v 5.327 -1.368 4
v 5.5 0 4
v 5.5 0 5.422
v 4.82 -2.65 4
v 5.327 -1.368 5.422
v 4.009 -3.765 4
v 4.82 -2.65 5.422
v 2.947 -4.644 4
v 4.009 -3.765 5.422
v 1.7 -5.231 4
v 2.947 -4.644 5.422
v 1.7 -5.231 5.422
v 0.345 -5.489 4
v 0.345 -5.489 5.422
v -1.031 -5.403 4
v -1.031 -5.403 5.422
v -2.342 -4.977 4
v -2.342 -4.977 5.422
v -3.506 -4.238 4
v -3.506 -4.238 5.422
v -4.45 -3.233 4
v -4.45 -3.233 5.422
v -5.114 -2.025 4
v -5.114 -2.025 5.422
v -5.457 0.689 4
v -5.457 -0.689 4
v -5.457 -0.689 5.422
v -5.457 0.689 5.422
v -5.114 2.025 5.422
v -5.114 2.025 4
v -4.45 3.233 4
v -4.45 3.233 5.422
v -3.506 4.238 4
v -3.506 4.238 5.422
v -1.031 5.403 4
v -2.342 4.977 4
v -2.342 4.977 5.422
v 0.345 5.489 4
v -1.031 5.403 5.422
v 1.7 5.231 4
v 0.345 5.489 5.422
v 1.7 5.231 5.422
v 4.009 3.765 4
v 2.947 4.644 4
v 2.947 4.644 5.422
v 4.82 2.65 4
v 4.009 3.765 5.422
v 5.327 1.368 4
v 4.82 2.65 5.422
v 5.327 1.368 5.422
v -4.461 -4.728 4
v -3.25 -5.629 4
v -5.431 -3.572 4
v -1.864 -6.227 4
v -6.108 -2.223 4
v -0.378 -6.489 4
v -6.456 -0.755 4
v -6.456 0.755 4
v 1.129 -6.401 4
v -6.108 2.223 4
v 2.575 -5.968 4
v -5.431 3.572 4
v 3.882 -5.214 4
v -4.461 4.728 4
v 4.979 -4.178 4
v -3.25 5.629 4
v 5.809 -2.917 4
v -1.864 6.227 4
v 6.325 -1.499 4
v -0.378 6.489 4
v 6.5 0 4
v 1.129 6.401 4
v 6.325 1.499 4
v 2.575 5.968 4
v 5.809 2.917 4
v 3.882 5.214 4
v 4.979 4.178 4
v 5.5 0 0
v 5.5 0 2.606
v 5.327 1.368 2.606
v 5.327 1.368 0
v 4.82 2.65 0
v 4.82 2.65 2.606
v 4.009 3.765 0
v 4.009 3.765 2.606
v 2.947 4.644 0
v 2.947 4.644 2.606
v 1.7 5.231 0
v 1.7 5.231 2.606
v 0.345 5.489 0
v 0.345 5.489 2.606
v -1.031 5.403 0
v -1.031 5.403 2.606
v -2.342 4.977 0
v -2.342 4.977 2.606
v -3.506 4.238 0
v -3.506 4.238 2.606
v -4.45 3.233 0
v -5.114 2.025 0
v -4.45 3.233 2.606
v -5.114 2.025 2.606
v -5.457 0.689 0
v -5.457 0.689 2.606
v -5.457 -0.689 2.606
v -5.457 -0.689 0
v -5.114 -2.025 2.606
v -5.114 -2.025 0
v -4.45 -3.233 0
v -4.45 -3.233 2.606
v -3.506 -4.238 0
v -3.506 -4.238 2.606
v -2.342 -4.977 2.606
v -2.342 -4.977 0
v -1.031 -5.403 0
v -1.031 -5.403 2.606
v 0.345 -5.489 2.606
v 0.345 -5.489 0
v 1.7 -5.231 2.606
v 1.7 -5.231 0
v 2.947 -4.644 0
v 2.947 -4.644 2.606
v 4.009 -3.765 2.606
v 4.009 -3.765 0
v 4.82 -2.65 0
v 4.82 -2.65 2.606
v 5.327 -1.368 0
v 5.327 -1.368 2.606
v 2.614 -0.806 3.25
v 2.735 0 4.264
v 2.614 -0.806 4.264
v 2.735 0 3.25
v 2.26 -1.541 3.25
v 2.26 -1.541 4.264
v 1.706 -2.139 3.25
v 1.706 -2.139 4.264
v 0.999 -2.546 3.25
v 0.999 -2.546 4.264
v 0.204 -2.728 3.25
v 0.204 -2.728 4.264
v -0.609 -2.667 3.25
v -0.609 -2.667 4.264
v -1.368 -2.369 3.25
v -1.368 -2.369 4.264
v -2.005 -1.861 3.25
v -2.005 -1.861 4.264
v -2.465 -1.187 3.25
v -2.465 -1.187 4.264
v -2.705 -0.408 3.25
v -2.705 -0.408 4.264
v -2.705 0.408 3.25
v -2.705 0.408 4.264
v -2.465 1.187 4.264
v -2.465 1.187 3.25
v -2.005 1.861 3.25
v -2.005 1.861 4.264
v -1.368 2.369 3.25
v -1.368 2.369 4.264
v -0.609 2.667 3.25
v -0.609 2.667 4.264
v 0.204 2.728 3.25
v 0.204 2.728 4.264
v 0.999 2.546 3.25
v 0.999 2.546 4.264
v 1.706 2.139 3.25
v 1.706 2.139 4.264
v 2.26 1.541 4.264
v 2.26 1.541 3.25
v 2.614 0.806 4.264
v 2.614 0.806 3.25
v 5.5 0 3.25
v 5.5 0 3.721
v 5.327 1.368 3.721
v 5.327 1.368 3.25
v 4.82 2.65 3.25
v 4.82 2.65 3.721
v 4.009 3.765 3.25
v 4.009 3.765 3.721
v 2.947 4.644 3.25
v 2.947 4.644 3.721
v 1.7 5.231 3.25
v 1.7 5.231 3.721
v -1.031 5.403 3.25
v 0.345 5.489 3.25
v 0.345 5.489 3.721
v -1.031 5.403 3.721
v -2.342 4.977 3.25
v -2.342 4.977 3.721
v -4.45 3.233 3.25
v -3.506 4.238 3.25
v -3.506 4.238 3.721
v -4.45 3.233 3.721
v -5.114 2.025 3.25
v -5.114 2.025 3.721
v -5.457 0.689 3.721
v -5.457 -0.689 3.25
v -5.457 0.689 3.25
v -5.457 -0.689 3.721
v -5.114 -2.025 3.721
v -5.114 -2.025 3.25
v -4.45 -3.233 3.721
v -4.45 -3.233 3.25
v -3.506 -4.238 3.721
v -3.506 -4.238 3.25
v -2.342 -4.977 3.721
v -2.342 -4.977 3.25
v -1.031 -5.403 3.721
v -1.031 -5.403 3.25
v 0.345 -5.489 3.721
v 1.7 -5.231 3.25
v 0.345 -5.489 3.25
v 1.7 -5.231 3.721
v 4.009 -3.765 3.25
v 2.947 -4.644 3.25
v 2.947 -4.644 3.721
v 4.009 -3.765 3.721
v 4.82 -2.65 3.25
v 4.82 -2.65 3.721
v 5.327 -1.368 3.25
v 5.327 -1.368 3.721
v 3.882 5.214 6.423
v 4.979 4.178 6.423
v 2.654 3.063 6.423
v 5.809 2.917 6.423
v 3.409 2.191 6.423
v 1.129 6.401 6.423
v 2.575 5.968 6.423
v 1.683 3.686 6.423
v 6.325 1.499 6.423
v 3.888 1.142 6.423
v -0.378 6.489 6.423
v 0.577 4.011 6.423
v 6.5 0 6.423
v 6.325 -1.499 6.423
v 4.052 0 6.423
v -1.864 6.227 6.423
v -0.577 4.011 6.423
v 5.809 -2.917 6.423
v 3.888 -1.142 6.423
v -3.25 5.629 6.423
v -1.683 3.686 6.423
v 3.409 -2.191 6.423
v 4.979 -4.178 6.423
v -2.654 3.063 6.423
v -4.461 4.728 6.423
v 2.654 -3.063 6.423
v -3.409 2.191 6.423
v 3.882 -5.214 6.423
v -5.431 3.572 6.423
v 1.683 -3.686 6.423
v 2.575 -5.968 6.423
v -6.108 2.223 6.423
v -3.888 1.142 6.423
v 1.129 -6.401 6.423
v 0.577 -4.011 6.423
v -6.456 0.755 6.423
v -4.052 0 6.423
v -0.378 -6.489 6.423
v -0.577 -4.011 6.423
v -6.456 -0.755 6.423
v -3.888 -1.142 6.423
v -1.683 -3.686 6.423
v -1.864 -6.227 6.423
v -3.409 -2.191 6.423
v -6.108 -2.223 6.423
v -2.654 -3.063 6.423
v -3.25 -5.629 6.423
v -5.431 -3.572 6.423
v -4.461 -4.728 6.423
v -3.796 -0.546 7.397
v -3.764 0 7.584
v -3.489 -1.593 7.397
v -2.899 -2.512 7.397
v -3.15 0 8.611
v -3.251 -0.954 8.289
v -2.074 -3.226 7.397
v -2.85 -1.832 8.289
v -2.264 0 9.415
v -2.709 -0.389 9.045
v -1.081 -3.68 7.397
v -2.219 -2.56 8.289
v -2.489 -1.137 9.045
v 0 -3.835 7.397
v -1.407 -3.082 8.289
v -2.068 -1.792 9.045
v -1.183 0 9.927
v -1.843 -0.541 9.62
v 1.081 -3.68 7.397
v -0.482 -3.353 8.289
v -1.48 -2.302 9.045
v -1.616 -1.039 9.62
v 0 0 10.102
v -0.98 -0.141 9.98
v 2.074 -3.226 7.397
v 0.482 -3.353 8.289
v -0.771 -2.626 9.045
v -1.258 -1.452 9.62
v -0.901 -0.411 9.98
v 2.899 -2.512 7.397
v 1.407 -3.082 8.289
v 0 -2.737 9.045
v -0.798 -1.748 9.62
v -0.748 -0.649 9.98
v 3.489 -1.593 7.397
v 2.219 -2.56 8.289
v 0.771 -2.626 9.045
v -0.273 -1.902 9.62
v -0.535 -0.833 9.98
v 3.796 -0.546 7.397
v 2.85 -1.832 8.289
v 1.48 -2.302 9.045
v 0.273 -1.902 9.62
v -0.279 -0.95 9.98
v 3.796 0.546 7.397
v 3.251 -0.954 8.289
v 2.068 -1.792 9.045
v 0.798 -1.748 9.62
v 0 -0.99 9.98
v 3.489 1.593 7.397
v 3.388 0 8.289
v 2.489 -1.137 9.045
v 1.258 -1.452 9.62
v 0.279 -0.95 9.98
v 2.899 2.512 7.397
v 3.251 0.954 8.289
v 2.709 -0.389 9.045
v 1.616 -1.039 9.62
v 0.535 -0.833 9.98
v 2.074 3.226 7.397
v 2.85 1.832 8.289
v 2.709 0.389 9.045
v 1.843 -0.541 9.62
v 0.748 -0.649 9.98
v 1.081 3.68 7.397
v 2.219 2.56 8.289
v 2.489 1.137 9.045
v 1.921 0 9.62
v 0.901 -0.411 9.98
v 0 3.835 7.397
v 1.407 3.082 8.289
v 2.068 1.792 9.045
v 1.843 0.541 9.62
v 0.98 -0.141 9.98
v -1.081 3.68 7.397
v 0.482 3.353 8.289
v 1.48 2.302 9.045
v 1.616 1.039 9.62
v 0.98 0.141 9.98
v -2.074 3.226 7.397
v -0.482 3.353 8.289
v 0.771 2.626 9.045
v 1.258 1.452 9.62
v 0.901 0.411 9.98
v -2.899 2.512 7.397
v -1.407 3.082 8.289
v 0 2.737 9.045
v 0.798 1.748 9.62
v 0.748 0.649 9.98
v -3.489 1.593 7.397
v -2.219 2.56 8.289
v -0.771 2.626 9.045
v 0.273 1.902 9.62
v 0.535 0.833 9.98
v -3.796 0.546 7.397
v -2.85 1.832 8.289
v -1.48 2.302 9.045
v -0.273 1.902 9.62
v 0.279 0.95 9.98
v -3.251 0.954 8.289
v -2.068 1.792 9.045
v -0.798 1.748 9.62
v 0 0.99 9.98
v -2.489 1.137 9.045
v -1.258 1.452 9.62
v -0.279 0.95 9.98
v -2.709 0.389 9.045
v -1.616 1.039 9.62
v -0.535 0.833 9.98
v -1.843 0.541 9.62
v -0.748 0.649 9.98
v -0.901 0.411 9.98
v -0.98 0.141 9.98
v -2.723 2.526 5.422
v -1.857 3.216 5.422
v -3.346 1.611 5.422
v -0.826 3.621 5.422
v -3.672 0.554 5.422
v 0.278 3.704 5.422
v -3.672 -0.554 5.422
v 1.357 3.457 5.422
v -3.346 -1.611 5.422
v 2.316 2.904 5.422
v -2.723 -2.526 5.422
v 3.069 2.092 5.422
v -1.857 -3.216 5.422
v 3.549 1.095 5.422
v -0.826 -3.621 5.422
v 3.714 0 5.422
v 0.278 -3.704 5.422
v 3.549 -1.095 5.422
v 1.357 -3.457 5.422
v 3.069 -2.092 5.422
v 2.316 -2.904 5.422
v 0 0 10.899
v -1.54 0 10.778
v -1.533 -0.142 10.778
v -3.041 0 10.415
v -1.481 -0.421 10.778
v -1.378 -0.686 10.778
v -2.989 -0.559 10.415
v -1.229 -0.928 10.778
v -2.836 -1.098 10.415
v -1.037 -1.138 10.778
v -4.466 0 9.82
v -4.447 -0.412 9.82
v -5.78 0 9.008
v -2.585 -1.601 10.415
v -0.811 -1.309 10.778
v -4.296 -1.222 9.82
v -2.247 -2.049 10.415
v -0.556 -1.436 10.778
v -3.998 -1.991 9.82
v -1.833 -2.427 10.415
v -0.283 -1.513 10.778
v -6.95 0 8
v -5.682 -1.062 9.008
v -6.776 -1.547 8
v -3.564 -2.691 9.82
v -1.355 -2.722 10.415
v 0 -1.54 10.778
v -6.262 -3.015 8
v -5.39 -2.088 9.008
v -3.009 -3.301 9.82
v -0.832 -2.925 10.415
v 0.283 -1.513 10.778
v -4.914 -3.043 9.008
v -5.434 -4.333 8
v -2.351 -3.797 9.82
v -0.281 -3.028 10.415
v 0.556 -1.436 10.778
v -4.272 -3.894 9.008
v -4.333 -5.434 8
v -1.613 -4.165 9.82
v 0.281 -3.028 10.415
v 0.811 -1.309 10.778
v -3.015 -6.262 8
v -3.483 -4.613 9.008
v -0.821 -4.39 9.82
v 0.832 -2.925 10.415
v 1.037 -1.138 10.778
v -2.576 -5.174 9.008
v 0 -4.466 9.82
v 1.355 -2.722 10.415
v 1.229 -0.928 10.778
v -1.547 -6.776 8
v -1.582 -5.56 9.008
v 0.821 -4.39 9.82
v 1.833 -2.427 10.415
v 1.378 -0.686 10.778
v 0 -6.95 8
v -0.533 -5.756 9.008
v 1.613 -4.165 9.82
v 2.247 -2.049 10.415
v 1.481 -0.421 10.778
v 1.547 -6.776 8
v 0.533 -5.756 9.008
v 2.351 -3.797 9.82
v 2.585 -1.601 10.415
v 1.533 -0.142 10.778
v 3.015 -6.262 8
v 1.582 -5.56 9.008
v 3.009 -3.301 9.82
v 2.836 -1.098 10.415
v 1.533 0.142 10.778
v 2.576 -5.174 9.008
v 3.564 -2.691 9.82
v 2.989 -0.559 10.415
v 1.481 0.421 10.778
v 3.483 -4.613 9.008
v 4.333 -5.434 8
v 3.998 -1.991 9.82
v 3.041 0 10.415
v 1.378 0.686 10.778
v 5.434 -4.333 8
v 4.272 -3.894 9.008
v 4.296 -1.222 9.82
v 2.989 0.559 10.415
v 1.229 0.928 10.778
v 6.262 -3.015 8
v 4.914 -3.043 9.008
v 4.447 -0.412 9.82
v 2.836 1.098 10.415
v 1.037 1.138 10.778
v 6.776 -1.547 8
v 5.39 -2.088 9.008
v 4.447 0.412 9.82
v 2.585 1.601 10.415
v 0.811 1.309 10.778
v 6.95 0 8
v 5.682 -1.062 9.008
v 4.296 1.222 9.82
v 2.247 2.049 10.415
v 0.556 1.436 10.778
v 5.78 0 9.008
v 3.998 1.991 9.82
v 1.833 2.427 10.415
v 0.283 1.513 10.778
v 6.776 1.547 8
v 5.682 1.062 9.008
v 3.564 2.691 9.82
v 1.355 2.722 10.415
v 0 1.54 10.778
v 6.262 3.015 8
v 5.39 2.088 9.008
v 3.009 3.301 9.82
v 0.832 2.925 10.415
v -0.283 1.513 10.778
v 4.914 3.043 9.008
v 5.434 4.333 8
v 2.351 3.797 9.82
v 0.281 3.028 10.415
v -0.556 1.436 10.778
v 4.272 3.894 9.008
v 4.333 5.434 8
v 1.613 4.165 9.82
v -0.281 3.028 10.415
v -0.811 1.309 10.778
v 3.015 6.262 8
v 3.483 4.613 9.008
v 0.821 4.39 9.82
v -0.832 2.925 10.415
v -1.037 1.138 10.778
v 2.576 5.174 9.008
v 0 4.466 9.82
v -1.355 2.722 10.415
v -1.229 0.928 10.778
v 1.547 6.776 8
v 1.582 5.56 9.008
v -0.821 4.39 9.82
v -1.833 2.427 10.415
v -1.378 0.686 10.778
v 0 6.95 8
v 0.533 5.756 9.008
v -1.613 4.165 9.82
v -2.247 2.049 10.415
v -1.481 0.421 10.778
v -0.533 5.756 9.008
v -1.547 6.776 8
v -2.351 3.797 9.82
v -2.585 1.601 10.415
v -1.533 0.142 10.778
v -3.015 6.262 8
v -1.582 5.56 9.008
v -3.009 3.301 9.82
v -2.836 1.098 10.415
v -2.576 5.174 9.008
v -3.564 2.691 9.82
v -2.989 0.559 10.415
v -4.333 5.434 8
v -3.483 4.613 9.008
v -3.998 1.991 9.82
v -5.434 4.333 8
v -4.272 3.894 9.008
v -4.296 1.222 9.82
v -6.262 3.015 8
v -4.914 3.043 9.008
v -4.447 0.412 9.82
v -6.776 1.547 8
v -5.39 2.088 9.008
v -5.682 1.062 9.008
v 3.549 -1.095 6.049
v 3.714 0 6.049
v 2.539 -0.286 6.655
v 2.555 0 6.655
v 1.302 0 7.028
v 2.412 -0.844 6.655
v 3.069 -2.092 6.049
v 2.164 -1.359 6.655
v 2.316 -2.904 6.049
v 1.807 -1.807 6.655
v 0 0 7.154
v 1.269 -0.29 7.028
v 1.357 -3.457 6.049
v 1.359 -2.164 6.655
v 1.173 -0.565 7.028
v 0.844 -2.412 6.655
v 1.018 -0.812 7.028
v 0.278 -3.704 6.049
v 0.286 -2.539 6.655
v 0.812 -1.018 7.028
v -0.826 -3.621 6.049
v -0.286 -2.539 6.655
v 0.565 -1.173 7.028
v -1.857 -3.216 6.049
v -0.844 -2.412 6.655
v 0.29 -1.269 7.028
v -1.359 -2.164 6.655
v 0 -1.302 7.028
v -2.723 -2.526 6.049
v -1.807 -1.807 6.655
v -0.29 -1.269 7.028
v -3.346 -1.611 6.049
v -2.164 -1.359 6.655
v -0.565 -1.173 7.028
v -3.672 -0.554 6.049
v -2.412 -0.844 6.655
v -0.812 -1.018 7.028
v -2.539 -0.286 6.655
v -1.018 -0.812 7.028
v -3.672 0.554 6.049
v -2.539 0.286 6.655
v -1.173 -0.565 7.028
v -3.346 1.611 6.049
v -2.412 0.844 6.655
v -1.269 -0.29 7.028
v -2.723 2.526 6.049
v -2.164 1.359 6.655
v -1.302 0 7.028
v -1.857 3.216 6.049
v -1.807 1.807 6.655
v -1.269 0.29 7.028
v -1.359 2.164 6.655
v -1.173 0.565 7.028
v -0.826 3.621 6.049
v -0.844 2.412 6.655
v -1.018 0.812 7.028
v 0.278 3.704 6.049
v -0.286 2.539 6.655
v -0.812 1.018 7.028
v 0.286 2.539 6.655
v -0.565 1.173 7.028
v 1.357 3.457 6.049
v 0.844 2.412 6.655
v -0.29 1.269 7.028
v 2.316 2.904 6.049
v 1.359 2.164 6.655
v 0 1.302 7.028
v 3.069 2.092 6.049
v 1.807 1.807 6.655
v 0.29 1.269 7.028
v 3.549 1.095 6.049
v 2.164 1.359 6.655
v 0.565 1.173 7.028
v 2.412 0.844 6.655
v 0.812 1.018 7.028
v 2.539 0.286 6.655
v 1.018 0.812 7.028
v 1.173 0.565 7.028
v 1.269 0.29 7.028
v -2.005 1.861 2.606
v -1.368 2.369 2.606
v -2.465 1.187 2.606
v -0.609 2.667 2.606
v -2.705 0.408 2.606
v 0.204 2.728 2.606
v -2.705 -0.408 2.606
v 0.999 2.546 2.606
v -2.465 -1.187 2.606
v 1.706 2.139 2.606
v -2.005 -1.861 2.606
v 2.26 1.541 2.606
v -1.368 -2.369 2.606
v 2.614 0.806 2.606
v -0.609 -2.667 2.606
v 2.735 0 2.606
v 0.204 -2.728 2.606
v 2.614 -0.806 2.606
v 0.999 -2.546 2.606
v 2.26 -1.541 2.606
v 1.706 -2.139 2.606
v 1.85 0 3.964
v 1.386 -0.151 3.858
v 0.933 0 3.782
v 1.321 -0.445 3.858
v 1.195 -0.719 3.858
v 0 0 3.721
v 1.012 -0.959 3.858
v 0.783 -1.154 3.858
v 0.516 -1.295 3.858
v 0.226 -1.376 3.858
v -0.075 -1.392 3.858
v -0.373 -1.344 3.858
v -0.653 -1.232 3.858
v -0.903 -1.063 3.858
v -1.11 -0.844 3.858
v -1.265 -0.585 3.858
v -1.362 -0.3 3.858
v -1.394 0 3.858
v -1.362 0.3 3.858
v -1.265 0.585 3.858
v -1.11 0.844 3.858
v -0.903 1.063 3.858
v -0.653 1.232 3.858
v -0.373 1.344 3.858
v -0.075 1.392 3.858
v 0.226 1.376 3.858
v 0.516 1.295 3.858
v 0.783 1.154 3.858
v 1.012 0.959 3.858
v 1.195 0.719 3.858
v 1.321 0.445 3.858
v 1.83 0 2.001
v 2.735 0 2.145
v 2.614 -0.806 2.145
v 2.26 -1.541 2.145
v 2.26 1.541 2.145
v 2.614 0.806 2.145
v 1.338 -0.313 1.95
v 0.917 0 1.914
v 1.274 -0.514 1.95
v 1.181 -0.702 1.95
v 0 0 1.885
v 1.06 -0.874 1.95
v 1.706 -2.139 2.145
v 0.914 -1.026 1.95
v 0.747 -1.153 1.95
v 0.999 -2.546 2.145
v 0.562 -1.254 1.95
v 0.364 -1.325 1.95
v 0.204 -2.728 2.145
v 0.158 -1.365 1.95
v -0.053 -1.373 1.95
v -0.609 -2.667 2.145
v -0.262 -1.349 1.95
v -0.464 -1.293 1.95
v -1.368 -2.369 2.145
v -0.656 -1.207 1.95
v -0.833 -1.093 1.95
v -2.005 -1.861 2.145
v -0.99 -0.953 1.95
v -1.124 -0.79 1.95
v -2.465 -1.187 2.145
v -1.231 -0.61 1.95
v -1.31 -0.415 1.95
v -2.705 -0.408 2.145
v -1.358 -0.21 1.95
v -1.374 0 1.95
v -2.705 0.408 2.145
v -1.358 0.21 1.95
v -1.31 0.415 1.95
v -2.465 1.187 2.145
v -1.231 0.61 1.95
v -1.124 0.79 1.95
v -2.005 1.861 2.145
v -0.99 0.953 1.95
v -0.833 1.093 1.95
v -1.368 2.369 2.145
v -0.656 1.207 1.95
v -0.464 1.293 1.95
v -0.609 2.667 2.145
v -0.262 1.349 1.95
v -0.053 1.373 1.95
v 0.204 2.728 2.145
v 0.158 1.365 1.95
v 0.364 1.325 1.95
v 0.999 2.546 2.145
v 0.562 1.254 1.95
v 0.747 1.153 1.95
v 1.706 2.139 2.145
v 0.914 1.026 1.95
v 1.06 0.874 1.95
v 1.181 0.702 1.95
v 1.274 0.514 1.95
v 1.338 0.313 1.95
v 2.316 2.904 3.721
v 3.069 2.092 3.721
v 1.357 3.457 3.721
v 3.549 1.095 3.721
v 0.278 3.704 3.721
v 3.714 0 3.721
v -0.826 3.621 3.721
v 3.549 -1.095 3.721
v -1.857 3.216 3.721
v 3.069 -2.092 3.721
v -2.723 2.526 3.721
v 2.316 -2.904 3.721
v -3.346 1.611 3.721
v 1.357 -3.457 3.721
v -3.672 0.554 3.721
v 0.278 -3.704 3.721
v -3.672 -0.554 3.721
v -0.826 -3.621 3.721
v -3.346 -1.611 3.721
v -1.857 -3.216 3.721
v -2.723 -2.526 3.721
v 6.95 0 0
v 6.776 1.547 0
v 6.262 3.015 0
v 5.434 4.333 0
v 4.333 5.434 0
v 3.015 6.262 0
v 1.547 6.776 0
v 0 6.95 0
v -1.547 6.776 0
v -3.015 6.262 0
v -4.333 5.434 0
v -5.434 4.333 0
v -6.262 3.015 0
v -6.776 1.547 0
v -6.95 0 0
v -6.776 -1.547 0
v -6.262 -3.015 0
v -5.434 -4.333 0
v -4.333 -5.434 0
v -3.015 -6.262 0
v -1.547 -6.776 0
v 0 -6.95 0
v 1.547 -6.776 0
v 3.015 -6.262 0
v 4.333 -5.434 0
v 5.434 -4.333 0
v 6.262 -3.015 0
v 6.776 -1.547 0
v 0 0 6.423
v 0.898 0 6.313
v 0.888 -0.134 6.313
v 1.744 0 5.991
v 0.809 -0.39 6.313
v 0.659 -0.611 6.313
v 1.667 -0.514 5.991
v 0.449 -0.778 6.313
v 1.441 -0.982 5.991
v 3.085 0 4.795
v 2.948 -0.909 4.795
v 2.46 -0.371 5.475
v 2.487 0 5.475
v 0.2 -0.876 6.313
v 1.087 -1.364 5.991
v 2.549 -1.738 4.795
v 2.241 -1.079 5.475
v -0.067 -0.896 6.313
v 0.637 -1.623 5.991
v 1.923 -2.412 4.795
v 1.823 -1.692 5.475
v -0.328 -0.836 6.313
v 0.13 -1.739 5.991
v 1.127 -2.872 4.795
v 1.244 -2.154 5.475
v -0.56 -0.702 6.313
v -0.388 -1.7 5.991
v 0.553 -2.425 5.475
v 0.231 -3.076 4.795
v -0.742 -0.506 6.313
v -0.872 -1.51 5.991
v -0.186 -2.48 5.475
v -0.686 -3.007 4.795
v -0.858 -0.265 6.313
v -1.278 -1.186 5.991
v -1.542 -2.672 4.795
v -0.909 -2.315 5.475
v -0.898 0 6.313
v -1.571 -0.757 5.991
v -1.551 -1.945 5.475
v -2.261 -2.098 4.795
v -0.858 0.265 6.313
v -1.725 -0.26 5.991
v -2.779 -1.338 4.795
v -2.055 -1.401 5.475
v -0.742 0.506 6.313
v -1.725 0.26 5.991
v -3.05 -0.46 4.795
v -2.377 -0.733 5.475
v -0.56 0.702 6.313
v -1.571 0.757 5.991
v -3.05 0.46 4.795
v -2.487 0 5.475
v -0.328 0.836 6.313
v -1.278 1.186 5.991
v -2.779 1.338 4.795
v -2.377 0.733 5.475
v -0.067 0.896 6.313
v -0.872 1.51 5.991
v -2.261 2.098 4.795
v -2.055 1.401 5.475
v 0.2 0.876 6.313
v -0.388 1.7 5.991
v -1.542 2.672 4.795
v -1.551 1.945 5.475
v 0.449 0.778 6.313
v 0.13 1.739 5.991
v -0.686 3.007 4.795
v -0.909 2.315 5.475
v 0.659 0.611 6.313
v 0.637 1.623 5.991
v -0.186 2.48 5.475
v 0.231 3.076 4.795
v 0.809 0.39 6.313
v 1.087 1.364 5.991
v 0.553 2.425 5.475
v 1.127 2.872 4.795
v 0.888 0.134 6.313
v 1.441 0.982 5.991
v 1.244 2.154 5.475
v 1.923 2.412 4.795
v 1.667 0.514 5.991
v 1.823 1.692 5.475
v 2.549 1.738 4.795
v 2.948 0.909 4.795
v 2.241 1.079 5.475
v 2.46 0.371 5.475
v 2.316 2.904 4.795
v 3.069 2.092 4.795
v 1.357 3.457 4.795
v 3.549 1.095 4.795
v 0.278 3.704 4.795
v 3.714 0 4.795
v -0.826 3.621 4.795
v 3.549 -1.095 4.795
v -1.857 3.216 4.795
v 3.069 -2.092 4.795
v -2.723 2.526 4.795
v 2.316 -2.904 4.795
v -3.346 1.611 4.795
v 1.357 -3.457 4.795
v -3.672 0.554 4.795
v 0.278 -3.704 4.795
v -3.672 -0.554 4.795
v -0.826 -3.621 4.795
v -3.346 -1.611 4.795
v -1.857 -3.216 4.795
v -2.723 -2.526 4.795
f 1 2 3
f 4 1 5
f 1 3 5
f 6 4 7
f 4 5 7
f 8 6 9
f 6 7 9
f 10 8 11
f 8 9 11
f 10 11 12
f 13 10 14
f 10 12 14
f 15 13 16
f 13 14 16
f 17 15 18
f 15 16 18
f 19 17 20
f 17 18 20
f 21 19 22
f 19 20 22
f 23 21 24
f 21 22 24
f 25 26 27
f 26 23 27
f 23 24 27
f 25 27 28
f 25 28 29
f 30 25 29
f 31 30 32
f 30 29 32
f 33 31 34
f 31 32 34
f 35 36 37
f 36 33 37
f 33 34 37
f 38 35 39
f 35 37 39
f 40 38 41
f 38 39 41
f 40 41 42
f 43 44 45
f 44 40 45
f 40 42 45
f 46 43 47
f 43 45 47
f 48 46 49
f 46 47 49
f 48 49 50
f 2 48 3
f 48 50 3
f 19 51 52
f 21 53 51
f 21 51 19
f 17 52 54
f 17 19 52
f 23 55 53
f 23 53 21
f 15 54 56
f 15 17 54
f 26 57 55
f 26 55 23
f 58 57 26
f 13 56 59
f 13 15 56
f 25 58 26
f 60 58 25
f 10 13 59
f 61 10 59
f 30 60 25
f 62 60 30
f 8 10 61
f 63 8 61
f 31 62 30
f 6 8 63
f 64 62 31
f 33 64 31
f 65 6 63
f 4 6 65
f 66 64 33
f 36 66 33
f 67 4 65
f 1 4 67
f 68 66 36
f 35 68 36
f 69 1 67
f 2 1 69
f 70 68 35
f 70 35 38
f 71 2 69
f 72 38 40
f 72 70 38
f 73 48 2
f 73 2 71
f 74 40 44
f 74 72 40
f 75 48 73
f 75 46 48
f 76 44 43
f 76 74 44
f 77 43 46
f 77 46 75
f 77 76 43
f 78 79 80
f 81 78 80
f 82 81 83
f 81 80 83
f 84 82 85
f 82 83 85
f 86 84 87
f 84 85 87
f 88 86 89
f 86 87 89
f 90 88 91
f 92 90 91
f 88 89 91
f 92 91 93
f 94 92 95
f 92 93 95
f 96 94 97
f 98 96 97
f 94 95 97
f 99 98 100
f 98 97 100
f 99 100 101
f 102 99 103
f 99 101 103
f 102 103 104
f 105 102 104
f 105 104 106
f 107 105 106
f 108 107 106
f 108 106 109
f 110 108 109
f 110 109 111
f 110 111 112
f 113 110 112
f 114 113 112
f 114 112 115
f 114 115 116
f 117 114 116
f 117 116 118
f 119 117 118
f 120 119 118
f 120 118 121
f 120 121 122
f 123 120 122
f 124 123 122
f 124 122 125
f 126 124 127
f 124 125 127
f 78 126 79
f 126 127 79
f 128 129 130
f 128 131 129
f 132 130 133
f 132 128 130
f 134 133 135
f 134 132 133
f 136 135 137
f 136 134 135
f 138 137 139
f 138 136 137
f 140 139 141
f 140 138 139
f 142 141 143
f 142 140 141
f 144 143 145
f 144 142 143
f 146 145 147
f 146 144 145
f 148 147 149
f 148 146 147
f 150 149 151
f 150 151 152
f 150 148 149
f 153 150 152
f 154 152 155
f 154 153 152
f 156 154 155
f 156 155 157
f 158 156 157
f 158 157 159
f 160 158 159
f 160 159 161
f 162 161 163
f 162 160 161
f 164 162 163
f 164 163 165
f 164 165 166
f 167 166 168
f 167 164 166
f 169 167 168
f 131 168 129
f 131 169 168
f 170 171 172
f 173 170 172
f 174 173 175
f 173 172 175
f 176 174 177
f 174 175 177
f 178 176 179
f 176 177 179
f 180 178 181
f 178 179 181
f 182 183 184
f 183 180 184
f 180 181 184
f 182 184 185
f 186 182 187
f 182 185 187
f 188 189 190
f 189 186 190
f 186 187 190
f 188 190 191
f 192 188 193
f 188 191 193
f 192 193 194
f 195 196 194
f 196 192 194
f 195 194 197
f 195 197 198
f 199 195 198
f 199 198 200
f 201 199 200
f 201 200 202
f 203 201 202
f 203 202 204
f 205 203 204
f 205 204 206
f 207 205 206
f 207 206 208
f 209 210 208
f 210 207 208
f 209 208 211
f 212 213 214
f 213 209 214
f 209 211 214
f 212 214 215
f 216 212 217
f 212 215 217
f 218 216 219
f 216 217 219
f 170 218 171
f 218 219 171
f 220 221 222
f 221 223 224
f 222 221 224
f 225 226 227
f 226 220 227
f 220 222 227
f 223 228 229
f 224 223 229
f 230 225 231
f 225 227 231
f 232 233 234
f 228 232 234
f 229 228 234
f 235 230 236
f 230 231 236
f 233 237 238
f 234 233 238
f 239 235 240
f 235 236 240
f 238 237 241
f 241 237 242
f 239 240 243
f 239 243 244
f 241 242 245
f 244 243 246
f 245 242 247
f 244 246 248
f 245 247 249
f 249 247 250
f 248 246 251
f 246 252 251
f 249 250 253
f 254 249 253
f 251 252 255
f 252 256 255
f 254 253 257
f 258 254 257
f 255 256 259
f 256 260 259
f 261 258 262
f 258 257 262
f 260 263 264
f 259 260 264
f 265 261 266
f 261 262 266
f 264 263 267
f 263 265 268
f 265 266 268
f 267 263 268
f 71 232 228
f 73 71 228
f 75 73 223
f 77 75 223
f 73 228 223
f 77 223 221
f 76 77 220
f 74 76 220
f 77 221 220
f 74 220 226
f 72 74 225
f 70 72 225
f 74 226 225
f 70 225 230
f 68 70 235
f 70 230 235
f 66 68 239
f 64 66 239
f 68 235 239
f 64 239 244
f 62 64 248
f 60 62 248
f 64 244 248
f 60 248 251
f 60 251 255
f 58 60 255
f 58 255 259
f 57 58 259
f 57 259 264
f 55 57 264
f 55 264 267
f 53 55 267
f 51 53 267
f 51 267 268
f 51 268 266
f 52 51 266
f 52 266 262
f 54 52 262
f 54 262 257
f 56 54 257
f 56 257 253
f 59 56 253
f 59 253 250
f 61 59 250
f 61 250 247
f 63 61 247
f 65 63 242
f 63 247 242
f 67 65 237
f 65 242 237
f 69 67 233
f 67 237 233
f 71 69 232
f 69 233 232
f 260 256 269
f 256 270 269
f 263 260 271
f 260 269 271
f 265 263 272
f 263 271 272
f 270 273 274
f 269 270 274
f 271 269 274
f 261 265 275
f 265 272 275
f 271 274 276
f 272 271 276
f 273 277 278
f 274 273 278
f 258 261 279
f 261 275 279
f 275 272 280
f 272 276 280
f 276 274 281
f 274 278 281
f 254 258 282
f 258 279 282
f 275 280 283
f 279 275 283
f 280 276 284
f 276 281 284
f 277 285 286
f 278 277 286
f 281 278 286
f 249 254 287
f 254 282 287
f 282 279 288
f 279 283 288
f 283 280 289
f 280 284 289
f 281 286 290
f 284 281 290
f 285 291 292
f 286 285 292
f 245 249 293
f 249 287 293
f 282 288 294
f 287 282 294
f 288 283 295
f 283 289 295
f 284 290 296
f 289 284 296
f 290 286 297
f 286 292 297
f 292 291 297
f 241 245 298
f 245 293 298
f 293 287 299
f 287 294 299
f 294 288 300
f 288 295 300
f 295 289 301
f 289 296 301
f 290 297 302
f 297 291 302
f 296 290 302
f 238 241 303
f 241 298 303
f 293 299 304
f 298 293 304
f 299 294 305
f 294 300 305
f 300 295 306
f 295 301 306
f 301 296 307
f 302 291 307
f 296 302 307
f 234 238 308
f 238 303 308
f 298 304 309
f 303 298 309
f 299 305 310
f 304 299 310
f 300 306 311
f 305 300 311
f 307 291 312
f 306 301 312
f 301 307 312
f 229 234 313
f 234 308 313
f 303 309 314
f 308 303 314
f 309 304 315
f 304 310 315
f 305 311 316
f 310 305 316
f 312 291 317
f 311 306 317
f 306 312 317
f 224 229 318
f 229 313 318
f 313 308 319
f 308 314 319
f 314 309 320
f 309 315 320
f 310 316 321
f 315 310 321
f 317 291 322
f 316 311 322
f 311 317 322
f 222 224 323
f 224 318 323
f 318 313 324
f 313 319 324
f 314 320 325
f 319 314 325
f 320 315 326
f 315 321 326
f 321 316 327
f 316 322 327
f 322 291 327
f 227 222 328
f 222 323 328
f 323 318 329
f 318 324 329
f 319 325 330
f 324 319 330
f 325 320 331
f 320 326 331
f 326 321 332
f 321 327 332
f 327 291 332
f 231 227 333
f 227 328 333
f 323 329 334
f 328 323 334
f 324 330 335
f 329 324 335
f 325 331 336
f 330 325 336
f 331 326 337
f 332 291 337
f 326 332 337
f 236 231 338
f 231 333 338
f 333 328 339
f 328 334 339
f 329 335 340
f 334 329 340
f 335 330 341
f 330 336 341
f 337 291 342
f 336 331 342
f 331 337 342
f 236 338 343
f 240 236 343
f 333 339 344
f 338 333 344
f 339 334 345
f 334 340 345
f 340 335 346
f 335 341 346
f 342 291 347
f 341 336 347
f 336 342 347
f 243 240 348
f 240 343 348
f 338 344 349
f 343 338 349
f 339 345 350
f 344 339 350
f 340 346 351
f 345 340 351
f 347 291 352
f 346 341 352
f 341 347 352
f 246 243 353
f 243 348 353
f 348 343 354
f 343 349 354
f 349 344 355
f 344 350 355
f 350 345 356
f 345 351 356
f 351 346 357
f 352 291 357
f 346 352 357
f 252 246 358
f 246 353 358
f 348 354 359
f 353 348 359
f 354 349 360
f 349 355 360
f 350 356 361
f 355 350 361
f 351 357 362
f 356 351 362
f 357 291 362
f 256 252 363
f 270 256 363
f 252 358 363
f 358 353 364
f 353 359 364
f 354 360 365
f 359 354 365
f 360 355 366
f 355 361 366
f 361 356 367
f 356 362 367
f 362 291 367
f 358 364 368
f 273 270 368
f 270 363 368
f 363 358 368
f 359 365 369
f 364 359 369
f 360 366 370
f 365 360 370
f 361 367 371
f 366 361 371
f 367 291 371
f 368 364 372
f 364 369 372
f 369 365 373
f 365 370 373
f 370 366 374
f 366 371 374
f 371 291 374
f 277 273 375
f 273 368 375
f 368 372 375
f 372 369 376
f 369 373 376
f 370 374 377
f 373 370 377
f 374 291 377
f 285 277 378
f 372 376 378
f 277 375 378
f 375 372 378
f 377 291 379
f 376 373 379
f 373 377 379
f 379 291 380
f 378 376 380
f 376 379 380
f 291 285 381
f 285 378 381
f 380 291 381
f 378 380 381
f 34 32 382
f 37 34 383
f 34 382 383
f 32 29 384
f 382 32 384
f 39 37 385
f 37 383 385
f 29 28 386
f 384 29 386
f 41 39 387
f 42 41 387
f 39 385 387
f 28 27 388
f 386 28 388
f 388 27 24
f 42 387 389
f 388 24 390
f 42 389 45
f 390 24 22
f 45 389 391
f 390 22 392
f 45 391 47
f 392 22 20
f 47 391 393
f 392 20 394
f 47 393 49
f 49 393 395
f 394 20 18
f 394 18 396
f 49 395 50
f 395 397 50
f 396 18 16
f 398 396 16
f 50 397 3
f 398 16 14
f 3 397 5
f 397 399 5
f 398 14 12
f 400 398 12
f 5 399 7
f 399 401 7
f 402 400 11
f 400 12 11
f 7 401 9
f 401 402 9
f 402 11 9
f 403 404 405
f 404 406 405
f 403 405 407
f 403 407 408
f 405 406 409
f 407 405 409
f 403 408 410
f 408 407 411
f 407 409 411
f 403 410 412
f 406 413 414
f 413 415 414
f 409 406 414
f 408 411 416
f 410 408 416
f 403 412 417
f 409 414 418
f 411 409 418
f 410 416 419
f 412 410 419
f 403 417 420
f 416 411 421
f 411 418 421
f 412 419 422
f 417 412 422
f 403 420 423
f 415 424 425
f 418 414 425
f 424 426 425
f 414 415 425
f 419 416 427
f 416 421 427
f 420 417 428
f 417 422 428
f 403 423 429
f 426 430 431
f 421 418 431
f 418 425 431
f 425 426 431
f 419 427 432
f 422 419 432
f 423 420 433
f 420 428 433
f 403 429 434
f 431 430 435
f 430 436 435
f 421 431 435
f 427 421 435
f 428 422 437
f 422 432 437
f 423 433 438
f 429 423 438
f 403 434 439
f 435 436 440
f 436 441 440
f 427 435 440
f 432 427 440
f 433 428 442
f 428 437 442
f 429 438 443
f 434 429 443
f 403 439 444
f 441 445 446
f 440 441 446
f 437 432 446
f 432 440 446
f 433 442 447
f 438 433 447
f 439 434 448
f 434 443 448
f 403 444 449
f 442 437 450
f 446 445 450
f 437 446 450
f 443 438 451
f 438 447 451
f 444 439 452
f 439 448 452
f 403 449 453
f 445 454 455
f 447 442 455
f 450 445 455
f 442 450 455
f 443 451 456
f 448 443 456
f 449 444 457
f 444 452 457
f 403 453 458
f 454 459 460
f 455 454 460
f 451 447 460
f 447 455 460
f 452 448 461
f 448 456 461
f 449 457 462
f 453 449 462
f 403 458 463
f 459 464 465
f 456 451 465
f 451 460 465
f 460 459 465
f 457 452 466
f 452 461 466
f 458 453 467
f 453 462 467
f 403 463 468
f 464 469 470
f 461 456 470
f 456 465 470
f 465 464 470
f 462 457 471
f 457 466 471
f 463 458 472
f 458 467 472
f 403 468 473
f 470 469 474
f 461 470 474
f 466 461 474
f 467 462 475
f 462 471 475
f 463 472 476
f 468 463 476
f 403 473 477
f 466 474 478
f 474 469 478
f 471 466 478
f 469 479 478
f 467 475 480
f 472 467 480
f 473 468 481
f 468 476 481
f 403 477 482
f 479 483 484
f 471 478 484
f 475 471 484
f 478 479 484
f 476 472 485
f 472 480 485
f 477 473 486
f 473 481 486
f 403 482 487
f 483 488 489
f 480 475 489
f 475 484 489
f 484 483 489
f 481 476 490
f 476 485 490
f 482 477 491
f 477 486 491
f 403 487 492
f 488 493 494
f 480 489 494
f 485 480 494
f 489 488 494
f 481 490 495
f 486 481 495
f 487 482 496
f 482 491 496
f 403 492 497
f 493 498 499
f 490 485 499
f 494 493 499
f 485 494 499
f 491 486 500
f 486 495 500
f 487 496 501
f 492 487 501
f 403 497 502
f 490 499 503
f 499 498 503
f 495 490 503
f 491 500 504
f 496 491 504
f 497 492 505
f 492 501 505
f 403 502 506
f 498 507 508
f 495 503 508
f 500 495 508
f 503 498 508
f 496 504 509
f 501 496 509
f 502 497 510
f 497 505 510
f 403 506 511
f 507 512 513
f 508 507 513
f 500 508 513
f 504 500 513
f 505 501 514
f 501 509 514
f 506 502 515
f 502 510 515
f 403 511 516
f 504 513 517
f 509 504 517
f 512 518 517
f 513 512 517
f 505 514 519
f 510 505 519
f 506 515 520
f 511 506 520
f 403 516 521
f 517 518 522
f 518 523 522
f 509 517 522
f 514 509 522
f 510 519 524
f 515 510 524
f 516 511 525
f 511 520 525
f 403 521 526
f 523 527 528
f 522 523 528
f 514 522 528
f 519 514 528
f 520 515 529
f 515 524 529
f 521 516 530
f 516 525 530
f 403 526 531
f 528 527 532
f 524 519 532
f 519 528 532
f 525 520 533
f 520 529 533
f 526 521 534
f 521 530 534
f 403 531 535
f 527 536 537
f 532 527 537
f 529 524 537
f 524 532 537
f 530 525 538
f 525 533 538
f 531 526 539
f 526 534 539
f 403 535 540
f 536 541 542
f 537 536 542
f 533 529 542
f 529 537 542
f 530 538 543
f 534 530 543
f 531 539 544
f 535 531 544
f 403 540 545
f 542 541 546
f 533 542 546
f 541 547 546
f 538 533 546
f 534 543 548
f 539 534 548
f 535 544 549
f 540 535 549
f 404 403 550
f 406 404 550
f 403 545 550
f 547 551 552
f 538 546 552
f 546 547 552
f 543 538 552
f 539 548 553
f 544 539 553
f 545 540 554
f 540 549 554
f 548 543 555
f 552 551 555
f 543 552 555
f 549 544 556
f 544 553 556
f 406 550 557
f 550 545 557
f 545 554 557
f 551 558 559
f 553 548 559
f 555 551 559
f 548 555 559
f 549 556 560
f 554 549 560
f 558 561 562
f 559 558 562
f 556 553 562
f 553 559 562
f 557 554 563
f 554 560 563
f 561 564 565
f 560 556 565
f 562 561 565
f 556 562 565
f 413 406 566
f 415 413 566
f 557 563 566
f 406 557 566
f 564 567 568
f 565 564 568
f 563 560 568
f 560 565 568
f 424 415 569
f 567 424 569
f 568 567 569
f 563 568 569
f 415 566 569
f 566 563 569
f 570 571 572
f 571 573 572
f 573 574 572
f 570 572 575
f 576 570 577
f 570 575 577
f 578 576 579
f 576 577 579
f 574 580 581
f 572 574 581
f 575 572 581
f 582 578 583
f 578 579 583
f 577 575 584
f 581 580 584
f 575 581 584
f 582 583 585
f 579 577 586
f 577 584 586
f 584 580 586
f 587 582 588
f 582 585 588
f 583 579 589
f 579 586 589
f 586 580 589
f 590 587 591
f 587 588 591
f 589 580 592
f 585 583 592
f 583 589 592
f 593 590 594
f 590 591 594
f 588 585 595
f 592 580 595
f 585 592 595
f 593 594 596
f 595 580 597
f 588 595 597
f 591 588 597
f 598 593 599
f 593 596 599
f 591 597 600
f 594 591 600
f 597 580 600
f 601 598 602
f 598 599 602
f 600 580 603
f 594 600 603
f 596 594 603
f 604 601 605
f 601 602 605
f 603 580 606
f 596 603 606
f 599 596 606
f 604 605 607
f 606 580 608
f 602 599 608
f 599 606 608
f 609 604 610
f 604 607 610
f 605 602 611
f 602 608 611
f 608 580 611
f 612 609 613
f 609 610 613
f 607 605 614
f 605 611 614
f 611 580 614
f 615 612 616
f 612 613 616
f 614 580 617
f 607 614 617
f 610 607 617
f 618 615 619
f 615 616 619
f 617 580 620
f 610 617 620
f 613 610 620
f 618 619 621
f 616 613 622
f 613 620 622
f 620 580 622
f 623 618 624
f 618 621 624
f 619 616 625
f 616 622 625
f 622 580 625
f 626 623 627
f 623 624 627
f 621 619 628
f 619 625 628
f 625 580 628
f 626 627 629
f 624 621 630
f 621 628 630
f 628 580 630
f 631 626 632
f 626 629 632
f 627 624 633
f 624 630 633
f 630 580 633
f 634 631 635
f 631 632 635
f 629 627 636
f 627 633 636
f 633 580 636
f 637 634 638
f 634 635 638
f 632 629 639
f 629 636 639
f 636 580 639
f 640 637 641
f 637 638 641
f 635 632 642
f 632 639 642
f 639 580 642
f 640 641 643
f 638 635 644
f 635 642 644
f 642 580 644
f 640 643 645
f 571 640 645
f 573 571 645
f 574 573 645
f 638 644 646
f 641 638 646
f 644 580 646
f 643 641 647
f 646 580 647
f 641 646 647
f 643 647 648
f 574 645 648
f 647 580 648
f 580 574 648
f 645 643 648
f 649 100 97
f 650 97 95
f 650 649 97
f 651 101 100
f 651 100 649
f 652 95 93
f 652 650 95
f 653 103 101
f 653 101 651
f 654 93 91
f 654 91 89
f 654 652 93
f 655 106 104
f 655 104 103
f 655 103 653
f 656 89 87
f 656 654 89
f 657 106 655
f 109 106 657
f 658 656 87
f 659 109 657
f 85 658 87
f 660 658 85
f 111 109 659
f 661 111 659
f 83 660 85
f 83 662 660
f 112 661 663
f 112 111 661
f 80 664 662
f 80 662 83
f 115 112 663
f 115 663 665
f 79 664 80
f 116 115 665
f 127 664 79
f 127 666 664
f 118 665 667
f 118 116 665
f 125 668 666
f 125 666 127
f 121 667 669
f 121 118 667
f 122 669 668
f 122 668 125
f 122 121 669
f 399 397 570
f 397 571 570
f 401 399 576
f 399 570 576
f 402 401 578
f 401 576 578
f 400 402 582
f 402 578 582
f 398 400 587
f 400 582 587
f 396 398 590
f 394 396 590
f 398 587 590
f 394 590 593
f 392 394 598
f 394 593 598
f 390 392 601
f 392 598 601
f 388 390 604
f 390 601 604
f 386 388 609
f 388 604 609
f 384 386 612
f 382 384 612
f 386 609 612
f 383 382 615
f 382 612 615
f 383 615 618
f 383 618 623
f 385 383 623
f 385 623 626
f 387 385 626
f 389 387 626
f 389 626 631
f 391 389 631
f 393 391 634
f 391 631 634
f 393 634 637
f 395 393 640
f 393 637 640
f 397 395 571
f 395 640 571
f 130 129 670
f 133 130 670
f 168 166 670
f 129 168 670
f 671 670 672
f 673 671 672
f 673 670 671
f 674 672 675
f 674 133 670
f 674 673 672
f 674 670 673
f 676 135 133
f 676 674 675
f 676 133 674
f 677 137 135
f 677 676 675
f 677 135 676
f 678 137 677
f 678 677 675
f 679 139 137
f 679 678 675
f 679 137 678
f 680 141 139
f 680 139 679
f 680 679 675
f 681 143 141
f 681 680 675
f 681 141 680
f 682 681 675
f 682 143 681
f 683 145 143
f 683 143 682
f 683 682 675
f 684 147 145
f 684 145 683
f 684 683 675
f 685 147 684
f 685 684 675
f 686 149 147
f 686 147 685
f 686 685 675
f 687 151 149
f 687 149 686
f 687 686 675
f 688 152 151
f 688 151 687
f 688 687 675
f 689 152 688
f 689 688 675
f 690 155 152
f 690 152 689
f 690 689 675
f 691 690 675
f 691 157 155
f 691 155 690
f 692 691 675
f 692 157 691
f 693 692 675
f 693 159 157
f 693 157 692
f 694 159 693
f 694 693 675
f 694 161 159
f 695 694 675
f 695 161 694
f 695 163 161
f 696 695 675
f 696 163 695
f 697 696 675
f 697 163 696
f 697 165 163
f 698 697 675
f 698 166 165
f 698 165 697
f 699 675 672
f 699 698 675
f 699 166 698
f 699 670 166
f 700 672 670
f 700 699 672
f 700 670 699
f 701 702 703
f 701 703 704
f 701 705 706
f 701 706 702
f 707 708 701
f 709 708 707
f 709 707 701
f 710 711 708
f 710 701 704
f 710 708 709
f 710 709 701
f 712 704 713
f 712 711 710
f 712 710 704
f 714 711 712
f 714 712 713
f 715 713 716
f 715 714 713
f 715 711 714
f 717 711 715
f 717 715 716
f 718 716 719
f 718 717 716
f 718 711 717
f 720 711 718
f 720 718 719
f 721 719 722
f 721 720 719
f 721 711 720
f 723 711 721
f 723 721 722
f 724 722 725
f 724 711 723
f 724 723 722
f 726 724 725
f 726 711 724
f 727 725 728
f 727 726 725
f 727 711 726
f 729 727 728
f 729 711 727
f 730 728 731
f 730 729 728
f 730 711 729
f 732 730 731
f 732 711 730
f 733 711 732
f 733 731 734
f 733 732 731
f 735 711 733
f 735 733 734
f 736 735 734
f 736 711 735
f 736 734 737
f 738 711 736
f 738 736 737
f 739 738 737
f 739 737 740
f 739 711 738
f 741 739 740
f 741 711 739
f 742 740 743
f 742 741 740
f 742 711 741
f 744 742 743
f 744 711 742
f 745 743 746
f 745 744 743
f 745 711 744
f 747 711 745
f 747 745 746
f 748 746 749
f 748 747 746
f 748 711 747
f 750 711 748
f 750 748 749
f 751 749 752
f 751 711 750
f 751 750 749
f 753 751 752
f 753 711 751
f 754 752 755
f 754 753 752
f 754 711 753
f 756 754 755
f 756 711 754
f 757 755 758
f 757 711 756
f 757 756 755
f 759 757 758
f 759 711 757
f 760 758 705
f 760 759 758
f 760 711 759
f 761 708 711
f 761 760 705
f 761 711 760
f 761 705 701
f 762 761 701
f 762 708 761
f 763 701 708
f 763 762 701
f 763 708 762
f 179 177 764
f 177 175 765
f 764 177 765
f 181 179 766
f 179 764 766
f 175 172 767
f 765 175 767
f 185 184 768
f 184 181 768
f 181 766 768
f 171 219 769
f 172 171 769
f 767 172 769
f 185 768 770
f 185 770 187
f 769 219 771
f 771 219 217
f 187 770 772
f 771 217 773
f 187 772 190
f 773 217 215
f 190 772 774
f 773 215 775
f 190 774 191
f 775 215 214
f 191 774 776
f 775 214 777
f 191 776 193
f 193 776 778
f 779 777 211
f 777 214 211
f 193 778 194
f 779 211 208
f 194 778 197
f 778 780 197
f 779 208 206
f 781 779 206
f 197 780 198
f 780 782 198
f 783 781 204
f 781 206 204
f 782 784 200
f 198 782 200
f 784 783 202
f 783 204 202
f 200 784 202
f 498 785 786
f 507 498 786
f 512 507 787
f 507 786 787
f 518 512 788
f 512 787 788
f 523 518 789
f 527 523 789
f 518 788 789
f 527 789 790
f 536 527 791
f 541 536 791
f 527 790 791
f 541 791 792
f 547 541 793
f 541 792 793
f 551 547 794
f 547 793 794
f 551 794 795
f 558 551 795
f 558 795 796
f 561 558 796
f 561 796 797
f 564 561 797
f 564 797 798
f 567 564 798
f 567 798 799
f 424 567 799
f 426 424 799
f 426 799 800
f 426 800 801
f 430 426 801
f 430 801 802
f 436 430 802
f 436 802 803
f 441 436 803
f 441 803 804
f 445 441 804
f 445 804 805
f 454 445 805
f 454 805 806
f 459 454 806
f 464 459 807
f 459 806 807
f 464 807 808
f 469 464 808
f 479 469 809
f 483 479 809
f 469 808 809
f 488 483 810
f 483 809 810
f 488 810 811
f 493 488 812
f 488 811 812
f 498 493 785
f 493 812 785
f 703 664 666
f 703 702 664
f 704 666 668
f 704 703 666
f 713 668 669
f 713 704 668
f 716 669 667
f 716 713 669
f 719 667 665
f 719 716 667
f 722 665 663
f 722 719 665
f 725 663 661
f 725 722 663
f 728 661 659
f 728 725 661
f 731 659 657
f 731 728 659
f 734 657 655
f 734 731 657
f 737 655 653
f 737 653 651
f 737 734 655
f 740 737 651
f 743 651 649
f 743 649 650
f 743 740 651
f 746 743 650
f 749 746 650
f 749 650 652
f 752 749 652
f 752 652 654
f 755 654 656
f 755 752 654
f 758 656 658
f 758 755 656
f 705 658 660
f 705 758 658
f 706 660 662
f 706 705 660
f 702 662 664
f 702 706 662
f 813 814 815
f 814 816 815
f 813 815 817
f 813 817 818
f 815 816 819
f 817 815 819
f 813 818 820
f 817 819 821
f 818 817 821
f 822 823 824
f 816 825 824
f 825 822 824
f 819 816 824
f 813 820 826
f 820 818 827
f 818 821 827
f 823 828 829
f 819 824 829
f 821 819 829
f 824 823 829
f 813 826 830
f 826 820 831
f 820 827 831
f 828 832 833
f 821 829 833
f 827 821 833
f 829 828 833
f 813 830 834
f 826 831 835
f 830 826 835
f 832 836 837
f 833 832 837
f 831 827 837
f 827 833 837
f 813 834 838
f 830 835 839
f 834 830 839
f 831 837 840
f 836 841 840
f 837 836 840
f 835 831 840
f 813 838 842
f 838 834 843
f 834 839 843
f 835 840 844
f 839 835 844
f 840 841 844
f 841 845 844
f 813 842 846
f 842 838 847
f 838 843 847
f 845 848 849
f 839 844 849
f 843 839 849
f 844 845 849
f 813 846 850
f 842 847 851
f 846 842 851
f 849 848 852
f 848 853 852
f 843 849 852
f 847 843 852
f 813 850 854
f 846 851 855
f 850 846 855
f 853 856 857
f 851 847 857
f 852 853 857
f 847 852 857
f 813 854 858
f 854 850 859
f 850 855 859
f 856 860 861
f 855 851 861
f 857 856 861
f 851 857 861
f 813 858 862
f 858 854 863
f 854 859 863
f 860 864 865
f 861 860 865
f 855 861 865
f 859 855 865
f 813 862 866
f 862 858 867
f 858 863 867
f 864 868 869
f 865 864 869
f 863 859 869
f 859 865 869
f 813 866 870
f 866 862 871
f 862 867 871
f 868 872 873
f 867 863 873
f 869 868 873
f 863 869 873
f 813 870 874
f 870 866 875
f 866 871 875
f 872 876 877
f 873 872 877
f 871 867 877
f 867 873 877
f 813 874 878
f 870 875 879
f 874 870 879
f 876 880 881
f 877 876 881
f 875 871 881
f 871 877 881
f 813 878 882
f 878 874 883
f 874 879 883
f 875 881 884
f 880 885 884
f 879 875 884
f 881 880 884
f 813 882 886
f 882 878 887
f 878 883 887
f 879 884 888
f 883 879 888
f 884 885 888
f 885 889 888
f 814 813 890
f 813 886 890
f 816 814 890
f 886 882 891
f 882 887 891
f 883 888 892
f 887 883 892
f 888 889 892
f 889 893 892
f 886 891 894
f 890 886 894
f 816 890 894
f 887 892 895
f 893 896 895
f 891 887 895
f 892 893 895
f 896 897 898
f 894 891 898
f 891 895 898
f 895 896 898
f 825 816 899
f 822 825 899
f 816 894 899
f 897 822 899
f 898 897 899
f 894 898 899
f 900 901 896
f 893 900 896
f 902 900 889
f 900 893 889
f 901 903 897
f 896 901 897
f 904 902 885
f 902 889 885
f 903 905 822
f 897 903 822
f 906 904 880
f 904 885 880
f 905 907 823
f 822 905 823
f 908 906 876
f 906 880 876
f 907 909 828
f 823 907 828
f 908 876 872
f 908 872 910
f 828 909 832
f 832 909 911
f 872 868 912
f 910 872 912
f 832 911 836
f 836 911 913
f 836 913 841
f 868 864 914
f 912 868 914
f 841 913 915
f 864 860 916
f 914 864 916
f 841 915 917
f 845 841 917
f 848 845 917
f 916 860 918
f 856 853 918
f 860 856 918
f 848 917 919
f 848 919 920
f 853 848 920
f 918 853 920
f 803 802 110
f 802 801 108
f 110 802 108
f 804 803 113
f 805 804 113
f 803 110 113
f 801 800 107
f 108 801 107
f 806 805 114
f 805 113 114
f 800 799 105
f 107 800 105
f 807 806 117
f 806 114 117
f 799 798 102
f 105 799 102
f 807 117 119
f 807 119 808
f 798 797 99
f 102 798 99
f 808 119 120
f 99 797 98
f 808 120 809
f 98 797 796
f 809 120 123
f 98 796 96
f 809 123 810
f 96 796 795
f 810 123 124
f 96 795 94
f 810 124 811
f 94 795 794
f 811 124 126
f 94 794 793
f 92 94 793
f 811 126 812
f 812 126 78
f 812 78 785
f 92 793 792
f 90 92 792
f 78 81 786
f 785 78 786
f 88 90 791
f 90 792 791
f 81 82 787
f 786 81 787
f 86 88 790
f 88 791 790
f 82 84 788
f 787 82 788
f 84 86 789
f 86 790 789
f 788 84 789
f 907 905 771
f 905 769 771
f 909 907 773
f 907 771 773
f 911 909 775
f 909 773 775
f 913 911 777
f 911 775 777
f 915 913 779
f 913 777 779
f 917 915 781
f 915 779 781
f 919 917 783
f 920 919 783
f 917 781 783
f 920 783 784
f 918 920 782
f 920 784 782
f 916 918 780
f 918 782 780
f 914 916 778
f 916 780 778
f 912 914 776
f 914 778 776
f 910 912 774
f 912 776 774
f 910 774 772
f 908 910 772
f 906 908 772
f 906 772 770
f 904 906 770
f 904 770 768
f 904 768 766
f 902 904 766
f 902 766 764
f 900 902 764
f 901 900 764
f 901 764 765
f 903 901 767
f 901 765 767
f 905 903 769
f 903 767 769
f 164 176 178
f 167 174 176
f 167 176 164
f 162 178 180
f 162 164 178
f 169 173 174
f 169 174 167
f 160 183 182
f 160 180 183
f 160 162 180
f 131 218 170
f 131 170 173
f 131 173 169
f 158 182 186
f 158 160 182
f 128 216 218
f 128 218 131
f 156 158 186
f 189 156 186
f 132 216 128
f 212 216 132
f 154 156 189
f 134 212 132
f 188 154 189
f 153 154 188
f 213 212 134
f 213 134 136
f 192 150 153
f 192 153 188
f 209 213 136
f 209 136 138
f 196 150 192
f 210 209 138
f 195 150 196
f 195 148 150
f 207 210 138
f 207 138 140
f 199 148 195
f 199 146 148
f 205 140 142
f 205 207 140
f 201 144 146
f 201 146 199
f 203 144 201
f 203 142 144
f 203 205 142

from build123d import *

# Parameters (mm, degrees)
ESBO_O1_R                = 6.95
RESSALTO_EXTRUS_O1_DEPTH = 8
ESBO_O2_R                = 6.5
CORTE_EXTRUS_O1_DEPTH    = 4
ESBO_O3_R                = 5.5
CORTE_EXTRUS_O2_DEPTH    = 11.611550311


with BuildPart() as part:
    # Esboço1 → Ressalto-extrusão1 (new body)
    with BuildSketch(Plane.XY):
        Circle(ESBO_O1_R)
    extrude(amount=RESSALTO_EXTRUS_O1_DEPTH)

    # Esboço2 → Corte-extrusão1 (cut)
    with BuildSketch(Plane.XY.offset(8)):
        Circle(ESBO_O2_R)
    extrude(amount=-CORTE_EXTRUS_O1_DEPTH, mode=Mode.SUBTRACT)

    # Esboço3 → Corte-extrusão2 (cut, through all)
    with BuildSketch(Plane.XY.offset(4)):
        Circle(ESBO_O3_R)
    extrude(amount=-CORTE_EXTRUS_O2_DEPTH, mode=Mode.SUBTRACT)

    # Esboço4 → Revolução1 (revolve)
    with BuildSketch(Plane(origin=(0, 0, 0), x_dir=(1, 0, 0), z_dir=(0, 1, 0))):
        with BuildLine():
            Line((-6.95, -8), (-6.5, -8))
            Line((-6.5, -8), (-6.5, -6.423040188))
            Line((-6.5, -6.423040188), (-4.052357622, -6.423040188))
            ThreePointArc((-4.052357622, -6.423040188), (-2.736736603, -9.045296291), (0, -10.10234809))
            Line((0, -10.10234809), (0, -10.899494937))
            ThreePointArc((0, -10.899494937), (-3.765287867, -10.145558539), (-6.95, -8))
        make_face()
    revolve(axis=Axis((0, 0, 0), (0, 0, 1)))

    # Esboço5 → Revolução2 (revolve)
    with BuildSketch(Plane(origin=(0, 0, 0), x_dir=(1, 0, 0), z_dir=(0, 1, 0)), mode=Mode.PRIVATE) as revolu_o2_sk:
        with BuildLine():
            Line((-3.713977707, -5.421872189), (-3.713977707, -6.04883524))
            ThreePointArc((-3.713977707, -6.04883524), (-1.937414068, -6.871607812), (0, -7.153671279))
            Line((0, -7.153671279), (0, -6.423040188))
            ThreePointArc((0, -6.423040188), (-1.744054919, -5.991033293), (-3.084817583, -4.794909137))
            Line((-3.084817583, -4.794909137), (-3.713977707, -4.794909137))
            Line((-3.713977707, -4.794909137), (-3.713977707, -3.721064783))
            Line((-3.713977707, -3.721064783), (-5.5, -3.721064783))
            Line((-5.5, -3.721064783), (-5.5, -5.421872189))
            Line((-5.5, -5.421872189), (-3.713977707, -5.421872189))
        make_face()
    revolve(revolu_o2_sk.sketch.rotate(Axis((0, 0, 10.899494937), (0, 0, -1)), 180), axis=Axis((0, 0, 10.899494937), (0, 0, -1)))

    # Esboço7 → Revolução3 (revolve)
    with BuildSketch(Plane(origin=(0, 0, 0), x_dir=(1, 0, 0), z_dir=(0, 1, 0)), mode=Mode.PRIVATE) as revolu_o3_sk:
        with BuildLine():
            Line((-2.735445453, -4.263680727), (-2.735445453, -3.250344697))
            Line((-2.735445453, -3.250344697), (-5.5, -3.250344697))
            Line((-5.5, -3.250344697), (-5.5, -2.605717645))
            Line((-5.5, -2.605717645), (-2.735445453, -2.605717645))
            Line((-2.735445453, -2.605717645), (-2.735445453, -2.145225421))
            ThreePointArc((-2.735445453, -2.145225421), (-1.373890676, -1.95031325), (0, -1.885147489))
            Line((0, -1.885147489), (0, -3.721064783))
            ThreePointArc((0, -3.721064783), (-1.394372071, -3.858027591), (-2.735445453, -4.263680727))
        make_face()
    revolve(revolu_o3_sk.sketch.rotate(Axis((0, 0, 10.899494937), (0, 0, -1)), 180), axis=Axis((0, 0, 10.899494937), (0, 0, -1)))


solid = part.part
